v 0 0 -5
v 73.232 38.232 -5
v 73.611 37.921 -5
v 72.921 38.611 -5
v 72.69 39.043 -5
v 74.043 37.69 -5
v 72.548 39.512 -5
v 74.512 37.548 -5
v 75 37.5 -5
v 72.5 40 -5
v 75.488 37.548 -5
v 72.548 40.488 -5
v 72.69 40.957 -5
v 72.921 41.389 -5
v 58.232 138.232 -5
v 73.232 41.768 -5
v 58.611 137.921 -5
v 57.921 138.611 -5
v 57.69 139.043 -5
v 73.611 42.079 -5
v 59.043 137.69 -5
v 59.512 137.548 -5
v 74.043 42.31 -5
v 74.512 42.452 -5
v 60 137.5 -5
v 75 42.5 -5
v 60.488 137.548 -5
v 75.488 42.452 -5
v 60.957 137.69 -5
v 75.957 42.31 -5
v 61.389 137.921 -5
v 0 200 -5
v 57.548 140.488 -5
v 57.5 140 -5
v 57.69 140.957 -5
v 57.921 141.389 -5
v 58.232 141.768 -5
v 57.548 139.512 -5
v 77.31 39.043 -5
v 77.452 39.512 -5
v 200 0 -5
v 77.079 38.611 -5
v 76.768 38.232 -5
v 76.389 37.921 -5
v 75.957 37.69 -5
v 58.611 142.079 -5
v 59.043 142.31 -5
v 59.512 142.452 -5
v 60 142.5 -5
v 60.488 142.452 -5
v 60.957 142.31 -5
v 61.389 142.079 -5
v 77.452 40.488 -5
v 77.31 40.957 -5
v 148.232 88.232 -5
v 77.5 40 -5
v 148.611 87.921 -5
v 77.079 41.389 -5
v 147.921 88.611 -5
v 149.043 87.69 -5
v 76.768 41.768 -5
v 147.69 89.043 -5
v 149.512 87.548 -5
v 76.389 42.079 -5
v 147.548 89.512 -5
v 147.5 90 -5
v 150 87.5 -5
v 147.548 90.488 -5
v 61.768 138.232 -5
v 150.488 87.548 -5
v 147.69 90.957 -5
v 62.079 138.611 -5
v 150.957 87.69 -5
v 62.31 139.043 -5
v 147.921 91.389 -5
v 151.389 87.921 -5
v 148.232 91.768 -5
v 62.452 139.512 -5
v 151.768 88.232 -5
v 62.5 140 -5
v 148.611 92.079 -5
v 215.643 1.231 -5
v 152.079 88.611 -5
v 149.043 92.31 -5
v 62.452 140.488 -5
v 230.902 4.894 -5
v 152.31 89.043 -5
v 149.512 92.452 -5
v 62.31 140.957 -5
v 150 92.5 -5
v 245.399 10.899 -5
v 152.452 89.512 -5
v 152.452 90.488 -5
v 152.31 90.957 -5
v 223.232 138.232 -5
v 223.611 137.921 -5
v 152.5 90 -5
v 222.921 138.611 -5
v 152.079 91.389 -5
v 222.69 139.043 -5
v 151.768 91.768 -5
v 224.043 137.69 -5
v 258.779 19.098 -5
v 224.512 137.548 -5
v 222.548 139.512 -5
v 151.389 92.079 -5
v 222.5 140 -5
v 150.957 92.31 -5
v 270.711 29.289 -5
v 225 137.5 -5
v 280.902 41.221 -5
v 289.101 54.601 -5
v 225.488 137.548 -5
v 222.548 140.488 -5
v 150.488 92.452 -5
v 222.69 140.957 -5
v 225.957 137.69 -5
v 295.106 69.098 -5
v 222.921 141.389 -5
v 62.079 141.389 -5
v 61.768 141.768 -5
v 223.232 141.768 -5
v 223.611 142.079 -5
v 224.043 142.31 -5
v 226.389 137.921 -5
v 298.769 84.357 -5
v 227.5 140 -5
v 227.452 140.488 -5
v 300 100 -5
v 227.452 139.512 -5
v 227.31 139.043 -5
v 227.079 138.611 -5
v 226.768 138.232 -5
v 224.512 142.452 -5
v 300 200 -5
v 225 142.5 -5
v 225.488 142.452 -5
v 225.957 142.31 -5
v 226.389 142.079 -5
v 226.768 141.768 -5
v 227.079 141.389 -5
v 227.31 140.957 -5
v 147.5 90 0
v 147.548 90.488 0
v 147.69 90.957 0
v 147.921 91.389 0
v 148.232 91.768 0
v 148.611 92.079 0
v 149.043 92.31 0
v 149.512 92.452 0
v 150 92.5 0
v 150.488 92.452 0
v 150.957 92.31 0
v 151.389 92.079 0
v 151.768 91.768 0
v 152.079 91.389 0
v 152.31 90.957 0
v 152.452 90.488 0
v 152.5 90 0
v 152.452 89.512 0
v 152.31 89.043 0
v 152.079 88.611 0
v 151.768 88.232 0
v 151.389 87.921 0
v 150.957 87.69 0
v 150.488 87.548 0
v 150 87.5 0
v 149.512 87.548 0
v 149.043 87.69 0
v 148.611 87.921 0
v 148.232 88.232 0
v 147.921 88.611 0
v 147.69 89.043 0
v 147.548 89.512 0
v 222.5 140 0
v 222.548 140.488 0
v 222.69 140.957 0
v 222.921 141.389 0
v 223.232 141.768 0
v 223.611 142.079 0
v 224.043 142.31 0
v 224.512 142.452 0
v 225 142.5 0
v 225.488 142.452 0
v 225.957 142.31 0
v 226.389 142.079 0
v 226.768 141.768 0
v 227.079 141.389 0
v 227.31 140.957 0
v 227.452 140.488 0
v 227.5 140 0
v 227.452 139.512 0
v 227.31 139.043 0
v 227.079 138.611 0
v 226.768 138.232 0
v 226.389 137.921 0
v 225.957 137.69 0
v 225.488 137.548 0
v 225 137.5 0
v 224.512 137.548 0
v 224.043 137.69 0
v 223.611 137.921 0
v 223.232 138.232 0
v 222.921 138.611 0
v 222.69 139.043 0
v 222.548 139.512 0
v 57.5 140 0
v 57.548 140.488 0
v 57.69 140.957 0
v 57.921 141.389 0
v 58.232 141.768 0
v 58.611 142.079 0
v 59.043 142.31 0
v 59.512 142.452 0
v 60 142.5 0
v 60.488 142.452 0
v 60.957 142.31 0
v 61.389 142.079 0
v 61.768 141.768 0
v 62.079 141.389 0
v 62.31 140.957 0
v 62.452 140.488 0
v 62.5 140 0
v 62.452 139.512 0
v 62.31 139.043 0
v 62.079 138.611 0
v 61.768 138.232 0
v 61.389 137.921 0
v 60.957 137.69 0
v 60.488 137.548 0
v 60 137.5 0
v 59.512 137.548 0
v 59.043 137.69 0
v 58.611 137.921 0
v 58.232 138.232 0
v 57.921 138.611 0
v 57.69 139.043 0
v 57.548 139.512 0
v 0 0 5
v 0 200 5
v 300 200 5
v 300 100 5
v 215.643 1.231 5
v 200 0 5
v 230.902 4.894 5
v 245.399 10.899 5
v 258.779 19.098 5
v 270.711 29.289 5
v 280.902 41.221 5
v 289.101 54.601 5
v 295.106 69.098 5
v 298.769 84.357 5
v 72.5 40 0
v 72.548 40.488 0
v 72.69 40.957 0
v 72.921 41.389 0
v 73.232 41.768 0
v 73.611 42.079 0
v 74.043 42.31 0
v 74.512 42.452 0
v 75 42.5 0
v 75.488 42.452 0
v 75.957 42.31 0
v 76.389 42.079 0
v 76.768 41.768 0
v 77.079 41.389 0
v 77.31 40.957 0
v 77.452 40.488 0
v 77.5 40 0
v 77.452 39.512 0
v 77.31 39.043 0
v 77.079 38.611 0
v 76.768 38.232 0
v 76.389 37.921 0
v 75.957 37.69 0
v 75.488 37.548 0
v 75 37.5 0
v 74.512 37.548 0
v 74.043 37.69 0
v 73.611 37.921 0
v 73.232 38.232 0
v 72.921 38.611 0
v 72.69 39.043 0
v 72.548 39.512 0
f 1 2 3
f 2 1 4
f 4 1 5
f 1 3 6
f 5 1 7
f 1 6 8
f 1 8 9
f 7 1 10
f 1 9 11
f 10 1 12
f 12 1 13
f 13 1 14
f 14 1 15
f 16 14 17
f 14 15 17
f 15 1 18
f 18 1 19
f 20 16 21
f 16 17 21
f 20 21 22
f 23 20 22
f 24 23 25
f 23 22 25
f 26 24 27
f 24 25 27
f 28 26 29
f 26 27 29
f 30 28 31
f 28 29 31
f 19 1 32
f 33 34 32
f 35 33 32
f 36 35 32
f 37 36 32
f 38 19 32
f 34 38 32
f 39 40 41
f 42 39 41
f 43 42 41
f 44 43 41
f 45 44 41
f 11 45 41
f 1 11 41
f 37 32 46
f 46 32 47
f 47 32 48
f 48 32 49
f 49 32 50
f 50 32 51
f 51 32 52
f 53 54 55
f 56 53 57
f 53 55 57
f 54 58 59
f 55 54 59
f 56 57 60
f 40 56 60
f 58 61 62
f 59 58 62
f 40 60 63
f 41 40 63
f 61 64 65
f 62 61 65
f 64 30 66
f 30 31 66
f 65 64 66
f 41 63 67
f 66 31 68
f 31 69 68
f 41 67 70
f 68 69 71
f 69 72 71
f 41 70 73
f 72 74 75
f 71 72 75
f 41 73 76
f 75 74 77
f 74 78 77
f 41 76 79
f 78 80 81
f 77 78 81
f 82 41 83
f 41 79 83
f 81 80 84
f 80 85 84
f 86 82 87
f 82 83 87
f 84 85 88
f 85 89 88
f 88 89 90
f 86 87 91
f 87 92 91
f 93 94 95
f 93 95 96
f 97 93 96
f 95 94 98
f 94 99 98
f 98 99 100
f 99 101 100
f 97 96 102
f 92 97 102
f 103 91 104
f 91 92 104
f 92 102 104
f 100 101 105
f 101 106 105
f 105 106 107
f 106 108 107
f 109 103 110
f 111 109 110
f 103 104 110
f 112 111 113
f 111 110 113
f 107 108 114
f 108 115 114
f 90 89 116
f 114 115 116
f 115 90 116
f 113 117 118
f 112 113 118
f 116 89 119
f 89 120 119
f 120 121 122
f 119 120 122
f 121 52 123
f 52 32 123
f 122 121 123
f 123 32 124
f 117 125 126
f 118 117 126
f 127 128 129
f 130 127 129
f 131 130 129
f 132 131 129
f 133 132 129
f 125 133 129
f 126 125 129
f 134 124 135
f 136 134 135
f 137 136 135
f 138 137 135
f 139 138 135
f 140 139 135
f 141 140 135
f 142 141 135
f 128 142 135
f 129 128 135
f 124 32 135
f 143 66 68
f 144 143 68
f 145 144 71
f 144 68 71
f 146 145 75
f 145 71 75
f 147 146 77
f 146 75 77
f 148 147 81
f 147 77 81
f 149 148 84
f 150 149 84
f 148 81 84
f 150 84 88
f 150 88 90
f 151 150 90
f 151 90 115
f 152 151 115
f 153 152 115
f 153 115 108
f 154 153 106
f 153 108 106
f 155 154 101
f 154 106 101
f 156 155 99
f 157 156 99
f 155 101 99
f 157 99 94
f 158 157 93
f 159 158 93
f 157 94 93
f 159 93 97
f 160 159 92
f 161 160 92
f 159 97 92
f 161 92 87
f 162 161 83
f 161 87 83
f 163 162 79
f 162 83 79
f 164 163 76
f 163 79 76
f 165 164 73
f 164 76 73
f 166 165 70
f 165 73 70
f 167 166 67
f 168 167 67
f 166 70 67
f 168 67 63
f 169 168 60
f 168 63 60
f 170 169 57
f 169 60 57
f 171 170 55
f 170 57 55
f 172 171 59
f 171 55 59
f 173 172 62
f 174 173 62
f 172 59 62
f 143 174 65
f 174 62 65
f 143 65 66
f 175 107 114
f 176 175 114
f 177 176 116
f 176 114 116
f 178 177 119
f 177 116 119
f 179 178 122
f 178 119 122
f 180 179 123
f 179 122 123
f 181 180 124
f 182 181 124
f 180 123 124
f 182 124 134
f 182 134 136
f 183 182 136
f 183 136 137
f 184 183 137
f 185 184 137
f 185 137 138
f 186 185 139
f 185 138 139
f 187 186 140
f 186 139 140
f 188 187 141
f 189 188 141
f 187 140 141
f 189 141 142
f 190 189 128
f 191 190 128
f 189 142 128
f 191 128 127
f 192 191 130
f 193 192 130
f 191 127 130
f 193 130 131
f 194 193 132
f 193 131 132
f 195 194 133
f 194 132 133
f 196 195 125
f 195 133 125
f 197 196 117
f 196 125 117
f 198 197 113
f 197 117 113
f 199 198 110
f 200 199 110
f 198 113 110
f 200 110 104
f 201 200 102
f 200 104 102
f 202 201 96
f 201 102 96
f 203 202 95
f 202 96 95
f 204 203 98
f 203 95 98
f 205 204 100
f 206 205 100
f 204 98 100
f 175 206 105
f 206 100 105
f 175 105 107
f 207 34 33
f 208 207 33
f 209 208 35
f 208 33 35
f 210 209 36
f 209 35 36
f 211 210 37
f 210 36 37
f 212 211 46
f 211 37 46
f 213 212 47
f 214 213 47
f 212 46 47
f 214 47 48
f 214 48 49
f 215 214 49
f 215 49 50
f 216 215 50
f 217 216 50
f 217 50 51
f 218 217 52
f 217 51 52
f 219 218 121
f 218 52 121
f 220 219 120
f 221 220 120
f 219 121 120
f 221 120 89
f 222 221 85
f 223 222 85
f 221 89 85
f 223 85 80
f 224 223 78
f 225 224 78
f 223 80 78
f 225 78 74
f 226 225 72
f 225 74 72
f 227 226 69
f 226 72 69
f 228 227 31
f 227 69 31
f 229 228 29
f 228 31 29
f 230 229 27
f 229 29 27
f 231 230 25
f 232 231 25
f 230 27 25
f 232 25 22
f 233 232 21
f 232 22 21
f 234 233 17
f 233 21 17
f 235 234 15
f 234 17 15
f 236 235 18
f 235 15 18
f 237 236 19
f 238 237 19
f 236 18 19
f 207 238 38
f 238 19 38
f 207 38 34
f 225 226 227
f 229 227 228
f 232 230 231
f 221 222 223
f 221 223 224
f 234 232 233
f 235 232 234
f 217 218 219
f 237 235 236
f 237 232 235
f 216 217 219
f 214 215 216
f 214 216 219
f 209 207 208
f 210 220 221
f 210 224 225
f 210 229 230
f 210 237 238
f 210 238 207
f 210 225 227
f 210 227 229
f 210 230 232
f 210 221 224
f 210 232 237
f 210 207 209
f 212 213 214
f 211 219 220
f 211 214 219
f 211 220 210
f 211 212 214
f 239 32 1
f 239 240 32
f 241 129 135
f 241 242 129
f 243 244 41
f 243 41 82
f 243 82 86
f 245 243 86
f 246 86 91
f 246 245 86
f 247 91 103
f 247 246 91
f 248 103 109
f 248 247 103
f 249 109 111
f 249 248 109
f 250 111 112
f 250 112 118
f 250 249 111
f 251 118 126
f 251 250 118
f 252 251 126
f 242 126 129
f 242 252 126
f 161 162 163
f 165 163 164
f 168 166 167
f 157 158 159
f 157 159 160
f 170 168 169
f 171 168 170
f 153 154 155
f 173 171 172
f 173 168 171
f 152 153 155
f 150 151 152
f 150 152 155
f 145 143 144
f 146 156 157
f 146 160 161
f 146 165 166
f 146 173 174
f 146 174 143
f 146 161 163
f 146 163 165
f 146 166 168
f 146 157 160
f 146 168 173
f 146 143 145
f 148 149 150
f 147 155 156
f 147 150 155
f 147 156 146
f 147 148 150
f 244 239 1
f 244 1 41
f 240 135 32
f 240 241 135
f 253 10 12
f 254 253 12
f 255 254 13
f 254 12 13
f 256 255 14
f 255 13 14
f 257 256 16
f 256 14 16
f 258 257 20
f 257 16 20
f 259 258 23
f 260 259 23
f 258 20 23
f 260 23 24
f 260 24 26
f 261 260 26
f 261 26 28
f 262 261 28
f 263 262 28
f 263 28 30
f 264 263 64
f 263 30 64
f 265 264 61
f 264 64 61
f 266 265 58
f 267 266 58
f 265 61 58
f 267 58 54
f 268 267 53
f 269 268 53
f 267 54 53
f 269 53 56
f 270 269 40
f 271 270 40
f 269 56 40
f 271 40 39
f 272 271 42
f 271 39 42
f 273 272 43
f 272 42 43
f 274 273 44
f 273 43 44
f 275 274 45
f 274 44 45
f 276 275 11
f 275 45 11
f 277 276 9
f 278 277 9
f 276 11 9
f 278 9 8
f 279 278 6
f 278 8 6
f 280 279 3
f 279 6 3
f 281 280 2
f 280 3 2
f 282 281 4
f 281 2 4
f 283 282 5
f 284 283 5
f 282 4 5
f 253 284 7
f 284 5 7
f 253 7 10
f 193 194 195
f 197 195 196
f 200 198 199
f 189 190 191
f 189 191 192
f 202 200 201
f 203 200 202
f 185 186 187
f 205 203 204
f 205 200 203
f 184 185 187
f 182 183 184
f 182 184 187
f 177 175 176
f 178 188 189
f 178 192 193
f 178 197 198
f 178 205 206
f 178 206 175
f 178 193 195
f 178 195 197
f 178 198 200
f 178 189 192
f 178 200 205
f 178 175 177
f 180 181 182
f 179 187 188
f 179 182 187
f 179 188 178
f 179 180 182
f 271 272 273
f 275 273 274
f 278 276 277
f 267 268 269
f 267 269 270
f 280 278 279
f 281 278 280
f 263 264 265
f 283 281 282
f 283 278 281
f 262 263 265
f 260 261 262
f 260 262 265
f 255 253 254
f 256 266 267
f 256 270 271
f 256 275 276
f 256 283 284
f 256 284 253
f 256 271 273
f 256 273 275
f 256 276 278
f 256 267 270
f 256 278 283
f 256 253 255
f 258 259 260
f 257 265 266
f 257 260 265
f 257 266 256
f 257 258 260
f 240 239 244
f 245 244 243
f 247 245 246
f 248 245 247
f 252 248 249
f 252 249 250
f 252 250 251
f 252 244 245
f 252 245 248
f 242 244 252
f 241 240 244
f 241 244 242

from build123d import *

# Parameters (mm, degrees)
BOSS_EXTRUDE1_DEPTH = 5
SKETCH6_R           = 2.5
CUT_EXTRUDE1_DEPTH  = 5


with BuildPart() as part:
    # Sketch1 → Boss-Extrude1 (new body, symmetric)
    with BuildSketch(Plane.XY):
        with BuildLine():
            Line((0, 200), (0, 0))
            Line((0, 0), (200, 0))
            ThreePointArc((200, 0), (270.710678119, 29.289321881), (300, 100))
            Line((300, 100), (300, 200))
            Line((300, 200), (0, 200))
        make_face()
    extrude(amount=BOSS_EXTRUDE1_DEPTH, both=True)

    # Sketch6 → Cut-Extrude1 (cut)
    with BuildSketch(Plane(origin=(0, 0, -5), x_dir=(-1, 0, 0), z_dir=(0, 0, -1))):
        with Locations((-225, 140)):
            Circle(SKETCH6_R)
        with Locations((-150, 90)):
            Circle(SKETCH6_R)
        with Locations((-60, 140)):
            Circle(SKETCH6_R)
        with Locations((-75, 40)):
            Circle(SKETCH6_R)
    extrude(amount=-CUT_EXTRUDE1_DEPTH, mode=Mode.SUBTRACT)


solid = part.part
